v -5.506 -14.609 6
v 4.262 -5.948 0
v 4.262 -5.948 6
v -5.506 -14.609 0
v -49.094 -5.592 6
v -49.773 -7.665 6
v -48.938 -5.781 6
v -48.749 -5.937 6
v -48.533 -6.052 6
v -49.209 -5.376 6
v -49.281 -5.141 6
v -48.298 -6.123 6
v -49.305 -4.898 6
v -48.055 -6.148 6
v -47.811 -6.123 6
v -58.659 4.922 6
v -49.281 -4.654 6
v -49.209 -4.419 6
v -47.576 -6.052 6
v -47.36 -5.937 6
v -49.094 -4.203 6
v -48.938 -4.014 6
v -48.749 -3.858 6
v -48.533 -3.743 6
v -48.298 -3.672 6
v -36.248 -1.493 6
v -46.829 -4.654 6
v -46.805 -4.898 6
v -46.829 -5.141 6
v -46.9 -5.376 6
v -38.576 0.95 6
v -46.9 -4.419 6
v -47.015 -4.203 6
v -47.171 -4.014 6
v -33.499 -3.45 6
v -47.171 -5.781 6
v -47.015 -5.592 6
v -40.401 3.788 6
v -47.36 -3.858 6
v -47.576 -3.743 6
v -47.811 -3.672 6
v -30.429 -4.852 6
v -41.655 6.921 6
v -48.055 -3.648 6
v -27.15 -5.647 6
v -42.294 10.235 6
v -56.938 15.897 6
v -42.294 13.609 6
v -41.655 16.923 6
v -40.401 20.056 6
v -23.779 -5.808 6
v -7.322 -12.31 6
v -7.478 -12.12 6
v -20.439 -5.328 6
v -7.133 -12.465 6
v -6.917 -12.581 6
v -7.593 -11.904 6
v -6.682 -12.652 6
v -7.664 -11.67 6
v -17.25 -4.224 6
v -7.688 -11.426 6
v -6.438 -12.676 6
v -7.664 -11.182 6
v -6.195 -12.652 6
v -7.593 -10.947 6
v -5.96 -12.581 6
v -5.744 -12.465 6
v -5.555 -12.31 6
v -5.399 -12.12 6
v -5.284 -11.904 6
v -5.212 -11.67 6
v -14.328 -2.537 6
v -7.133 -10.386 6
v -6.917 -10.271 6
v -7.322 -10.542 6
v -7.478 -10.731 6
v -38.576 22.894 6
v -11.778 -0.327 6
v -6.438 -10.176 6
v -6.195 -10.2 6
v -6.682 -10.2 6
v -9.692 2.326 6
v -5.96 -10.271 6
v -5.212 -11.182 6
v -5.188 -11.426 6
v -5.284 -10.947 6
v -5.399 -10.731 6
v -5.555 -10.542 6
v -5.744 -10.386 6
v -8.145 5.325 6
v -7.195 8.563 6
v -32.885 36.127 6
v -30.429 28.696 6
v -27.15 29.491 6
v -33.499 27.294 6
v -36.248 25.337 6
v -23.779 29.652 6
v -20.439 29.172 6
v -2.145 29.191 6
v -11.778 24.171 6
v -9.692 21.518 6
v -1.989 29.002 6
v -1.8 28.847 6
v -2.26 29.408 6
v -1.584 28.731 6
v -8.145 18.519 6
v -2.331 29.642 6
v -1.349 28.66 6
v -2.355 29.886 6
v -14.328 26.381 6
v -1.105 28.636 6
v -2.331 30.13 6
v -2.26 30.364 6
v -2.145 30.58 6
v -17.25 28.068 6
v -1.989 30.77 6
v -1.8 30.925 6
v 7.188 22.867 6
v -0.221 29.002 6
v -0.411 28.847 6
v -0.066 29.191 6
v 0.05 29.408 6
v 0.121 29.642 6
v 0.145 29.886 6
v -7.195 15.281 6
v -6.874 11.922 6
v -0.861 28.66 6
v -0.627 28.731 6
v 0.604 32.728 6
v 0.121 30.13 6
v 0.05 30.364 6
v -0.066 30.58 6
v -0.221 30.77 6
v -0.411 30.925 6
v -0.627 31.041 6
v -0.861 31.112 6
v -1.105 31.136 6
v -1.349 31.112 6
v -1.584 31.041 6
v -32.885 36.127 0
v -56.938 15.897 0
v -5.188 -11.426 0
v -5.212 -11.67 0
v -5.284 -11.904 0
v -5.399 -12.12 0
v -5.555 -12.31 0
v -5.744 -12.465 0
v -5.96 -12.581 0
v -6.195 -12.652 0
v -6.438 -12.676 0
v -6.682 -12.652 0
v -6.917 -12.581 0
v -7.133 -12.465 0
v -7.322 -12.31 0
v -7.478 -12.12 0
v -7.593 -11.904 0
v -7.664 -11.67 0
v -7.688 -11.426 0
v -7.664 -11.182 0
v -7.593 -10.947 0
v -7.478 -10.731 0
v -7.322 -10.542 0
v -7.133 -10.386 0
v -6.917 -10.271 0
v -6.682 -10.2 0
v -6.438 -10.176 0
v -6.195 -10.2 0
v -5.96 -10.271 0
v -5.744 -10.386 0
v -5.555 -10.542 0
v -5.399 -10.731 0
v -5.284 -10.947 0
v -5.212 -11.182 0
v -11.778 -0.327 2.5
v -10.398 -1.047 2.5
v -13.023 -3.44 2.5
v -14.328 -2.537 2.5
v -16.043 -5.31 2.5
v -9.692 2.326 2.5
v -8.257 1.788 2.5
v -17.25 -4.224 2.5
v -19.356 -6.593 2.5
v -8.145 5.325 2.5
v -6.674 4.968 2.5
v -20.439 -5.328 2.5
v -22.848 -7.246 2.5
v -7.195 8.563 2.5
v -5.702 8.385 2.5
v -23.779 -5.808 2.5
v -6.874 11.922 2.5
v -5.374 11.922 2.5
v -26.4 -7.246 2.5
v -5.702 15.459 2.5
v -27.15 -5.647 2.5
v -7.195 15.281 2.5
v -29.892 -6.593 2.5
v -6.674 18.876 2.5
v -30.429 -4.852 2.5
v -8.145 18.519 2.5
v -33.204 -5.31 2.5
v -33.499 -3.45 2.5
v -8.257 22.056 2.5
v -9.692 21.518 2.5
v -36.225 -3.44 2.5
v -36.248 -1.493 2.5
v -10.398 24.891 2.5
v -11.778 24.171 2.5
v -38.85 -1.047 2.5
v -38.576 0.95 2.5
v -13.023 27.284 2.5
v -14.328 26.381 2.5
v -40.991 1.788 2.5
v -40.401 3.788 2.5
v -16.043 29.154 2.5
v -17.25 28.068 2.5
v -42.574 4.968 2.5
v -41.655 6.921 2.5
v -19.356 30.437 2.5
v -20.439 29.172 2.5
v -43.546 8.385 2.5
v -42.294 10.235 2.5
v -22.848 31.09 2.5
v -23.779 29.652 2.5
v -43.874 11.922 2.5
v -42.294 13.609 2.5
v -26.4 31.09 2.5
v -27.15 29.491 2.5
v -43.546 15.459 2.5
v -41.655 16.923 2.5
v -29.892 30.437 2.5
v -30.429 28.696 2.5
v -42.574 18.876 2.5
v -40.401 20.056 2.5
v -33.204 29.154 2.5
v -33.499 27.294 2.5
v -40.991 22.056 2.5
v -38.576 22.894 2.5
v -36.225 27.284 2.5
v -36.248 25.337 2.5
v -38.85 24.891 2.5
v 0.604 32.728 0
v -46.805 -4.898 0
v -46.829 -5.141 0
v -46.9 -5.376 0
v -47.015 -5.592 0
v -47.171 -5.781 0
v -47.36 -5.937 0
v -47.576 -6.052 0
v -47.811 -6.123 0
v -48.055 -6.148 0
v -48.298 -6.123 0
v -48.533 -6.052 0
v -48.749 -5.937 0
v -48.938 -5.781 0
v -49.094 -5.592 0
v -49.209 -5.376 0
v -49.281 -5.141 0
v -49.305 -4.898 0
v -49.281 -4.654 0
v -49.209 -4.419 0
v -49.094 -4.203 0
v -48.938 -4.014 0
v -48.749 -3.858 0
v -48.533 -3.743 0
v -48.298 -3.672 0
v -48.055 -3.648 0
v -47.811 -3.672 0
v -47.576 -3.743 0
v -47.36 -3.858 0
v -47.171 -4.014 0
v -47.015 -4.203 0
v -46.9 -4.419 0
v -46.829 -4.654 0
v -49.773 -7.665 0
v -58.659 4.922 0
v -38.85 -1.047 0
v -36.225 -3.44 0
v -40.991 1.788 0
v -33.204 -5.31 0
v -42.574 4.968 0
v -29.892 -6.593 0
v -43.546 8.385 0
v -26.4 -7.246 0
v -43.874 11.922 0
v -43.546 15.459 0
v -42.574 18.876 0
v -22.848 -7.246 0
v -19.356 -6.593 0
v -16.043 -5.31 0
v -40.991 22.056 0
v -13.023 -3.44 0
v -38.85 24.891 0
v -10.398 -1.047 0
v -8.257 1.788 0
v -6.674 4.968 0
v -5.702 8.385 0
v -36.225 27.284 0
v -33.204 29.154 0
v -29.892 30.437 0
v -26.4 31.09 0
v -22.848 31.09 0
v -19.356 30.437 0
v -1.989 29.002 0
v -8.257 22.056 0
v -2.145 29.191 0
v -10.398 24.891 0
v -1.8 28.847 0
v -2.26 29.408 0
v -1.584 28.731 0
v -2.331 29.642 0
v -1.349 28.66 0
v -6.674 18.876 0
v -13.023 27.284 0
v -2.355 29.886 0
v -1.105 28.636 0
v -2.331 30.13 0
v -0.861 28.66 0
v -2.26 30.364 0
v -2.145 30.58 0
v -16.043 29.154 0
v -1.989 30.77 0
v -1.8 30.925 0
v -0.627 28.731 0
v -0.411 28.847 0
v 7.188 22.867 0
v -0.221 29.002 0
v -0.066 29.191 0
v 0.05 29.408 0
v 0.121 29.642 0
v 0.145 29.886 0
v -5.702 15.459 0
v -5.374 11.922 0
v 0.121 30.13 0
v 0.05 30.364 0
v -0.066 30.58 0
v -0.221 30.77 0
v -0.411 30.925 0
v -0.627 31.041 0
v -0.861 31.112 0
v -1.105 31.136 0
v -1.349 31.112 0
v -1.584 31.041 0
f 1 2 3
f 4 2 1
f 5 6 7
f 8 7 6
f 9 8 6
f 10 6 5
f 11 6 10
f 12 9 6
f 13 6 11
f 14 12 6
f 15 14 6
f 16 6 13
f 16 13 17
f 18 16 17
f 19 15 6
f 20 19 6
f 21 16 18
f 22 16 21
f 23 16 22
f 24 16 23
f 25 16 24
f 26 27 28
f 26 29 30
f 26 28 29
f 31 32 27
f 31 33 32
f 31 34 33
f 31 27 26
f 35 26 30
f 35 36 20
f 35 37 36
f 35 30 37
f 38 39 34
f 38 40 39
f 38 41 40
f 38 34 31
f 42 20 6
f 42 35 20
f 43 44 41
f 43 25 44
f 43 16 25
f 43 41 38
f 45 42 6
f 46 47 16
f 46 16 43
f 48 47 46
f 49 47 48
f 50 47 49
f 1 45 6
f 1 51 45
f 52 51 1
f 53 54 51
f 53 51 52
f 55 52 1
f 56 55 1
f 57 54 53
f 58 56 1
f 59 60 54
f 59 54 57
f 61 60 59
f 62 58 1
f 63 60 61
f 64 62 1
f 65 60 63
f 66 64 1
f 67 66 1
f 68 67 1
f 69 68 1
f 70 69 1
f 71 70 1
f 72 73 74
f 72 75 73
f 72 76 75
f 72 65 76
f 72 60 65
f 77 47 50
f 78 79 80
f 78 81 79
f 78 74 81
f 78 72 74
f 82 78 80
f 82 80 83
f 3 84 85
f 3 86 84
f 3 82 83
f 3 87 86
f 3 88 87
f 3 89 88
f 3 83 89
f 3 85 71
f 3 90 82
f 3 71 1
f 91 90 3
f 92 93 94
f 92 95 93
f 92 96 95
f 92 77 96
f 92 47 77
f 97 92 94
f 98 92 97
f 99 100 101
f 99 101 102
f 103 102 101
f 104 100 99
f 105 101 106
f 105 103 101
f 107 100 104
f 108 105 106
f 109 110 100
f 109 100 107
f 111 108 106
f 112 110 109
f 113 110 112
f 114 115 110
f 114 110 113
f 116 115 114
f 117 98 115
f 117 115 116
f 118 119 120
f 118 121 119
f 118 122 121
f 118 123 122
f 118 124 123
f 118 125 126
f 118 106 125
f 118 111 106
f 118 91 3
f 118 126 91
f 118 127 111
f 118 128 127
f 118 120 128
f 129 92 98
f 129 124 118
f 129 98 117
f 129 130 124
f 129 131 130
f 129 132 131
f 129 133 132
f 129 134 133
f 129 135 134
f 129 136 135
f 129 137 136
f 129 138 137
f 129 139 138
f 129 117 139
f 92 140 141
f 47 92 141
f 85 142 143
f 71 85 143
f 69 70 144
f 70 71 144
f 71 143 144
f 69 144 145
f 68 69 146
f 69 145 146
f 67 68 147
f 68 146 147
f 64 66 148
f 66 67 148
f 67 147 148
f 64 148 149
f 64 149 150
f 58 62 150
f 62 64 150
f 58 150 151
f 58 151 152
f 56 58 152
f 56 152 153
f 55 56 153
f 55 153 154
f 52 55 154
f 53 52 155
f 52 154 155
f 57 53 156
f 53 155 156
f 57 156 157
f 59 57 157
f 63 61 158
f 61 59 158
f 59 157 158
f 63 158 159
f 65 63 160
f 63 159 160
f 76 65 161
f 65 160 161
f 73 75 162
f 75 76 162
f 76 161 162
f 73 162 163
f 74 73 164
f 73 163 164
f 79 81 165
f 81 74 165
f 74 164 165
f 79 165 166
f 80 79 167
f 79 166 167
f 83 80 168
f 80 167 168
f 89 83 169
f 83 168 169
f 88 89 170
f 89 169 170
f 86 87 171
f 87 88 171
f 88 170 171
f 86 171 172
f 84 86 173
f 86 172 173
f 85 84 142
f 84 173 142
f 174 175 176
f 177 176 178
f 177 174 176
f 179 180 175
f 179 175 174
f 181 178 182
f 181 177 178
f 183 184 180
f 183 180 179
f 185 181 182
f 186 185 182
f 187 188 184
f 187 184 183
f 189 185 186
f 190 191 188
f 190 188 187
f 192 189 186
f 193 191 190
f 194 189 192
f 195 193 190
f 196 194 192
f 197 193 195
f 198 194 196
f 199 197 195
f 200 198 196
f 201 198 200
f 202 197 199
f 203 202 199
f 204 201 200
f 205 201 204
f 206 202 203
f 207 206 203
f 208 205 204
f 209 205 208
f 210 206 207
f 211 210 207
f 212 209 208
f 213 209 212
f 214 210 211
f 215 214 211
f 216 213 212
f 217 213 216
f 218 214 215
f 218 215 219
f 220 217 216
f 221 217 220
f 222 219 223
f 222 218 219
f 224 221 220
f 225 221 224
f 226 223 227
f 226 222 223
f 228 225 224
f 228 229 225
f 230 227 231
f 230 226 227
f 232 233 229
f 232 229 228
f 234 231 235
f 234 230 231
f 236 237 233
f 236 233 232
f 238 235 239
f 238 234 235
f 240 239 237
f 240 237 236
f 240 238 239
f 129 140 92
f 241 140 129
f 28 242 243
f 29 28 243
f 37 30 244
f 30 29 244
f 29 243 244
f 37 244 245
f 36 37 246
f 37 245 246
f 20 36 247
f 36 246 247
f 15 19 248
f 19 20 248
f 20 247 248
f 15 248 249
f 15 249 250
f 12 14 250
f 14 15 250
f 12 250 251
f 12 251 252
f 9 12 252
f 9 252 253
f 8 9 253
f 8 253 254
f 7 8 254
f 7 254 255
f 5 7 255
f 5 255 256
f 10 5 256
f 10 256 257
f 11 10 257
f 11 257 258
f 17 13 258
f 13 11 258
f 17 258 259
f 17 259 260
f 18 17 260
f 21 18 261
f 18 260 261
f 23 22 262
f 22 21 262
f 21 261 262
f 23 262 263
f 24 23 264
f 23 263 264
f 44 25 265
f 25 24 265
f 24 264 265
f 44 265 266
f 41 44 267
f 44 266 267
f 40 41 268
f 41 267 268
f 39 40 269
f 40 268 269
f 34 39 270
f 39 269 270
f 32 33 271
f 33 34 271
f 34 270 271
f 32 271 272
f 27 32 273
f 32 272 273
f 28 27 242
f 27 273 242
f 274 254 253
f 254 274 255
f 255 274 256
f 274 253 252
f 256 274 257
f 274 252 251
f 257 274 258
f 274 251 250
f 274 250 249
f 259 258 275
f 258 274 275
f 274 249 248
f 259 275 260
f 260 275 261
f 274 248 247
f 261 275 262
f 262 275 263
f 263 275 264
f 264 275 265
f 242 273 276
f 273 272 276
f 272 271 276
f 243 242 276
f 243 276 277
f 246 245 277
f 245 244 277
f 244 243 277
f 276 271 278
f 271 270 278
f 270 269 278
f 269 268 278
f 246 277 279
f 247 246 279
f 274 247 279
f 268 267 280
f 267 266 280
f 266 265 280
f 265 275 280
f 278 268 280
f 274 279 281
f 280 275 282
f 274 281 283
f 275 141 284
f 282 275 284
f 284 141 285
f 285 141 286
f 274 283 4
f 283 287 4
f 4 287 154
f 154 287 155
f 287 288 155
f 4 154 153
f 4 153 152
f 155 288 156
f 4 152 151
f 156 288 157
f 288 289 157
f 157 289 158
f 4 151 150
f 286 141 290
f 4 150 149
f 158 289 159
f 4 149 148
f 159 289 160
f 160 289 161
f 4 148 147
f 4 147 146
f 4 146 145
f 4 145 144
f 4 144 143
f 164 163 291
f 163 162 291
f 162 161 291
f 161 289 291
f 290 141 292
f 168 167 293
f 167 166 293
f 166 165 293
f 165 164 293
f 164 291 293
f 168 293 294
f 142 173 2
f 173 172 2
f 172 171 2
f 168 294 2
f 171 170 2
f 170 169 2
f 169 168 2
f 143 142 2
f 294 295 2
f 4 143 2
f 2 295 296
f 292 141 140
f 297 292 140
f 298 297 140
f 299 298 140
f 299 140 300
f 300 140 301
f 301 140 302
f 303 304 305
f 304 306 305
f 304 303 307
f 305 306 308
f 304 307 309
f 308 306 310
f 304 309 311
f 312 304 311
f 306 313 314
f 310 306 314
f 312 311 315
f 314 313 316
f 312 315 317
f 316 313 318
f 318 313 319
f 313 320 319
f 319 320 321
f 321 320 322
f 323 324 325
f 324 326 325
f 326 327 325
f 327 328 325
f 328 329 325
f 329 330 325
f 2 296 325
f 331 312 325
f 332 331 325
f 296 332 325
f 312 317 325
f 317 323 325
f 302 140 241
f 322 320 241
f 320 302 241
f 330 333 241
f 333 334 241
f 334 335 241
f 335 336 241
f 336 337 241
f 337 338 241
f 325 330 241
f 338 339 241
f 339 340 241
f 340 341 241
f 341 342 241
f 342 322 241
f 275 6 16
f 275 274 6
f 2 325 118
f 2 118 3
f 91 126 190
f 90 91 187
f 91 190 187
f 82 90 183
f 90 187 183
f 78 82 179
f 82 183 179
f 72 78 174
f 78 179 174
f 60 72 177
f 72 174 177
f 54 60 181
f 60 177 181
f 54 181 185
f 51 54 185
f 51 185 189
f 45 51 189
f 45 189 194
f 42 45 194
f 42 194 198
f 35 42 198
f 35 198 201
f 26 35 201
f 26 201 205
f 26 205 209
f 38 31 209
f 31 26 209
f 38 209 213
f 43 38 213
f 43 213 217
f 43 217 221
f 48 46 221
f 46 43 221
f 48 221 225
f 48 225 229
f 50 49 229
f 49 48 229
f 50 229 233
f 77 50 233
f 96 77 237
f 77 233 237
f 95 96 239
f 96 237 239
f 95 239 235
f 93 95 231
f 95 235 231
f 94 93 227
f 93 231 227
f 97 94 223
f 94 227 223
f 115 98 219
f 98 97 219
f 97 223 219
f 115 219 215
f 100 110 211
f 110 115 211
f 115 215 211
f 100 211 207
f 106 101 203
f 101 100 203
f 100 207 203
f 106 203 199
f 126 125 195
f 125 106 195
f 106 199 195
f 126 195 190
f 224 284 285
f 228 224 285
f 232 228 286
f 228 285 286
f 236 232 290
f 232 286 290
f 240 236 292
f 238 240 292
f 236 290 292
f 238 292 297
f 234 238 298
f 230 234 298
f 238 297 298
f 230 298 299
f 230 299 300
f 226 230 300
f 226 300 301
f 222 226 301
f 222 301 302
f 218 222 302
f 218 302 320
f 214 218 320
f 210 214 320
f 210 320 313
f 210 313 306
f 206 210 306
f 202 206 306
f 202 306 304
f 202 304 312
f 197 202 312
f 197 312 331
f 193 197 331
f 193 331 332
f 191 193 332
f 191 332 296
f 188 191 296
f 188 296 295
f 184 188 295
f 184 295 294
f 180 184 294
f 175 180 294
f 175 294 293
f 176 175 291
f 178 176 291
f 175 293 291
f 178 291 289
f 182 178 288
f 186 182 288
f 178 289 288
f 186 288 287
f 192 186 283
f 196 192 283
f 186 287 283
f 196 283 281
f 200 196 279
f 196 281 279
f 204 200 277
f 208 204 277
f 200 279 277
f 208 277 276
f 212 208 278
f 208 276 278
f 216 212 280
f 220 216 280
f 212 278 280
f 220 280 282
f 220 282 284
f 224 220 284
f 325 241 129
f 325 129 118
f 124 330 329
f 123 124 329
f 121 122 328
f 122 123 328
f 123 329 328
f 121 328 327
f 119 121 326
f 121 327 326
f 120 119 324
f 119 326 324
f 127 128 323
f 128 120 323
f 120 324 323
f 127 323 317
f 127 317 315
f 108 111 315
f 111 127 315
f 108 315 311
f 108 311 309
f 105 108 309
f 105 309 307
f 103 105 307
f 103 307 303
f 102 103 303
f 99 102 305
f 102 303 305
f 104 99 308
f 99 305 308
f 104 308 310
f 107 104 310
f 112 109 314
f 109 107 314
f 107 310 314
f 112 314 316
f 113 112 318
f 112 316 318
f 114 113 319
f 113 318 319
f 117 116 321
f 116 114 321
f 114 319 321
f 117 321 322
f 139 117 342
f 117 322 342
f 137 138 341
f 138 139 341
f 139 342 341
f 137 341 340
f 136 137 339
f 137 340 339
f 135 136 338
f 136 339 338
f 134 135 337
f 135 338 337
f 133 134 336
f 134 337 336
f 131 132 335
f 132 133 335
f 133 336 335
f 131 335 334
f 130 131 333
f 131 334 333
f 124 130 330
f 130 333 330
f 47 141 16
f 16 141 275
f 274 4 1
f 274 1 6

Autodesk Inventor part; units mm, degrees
ref_plane "YZ Plane" through (0, 0, 0) normal (1, 0, 0) x (0, 1, 0)
ref_plane "XZ Plane" through (0, 0, 0) normal (0, 1, 0) x (-1, 0, 0)
ref_plane "XY Plane" through (0, 0, 0) normal (0, 0, 1) x (1, 0, 0)
sketch "Sketch1" plane through (0, 0, 0) normal (0, 0, 1) x (1, 0, 0)
  line L0 (0.6045, 32.7277) -> (-43.9747, 37.2532) construction
  line L1 (-49.7733, -7.6646) -> (-5.5064, -14.6087) construction
  circle A0 centre (-43.015, 34.1404) radius 3.175 construction
  line L2 (-5.5064, -14.6087) -> (15.1919, 3.7419) construction
  line L3 (-42.0553, 31.0275) -> (-2.8152, 27.0441) construction
  line L4 (-7.3705, -8.2429) -> (-46.3358, -2.1305) construction
  line L5 (9.5291, 6.74) -> (-7.3705, -8.2429) construction
  line L6 (-2.8152, 27.0441) -> (9.7254, 8.2606) construction
  line L7 (-32.8846, 36.1274) -> (0.6045, 32.7277)
  line L8 (-32.8846, 36.1274) -> (-56.9375, 15.8971)
  line L9 (-65.2029, 14.1906) -> (-49.7733, -7.6646) construction
  line L10 (15.9639, 9.7222) -> (0.6045, 32.7277) construction
  line L11 (0.6045, 32.7277) -> (7.1877, 22.8674)
  line L12 (7.1877, 22.8674) -> (4.2625, -5.9478)
  line L13 (4.2625, -5.9478) -> (-5.5064, -14.6087)
  line L14 (-5.5064, -14.6087) -> (-49.7733, -7.6646)
  line L15 (-49.7733, -7.6646) -> (-58.6592, 4.9218)
  line L16 (-56.9375, 15.8971) -> (-58.6592, 4.9218)
  line L17 (-58.7974, 16.9461) -> (-42.0553, 31.0275) construction
  circle A1 centre (-24.6239, 11.922) radius 17.75
  circle A2 centre (-1.1053, 29.8859) radius 1.25
  circle A3 centre (-48.0546, -4.8975) radius 1.25
  circle A4 centre (-6.4384, -11.4258) radius 1.25
  point P0 (0, 0)
  dimension "d0" = 2
  dimension "d1" = 2
  dimension "d2" = 4
extrude "Extrusion1" add sketch "Sketch1" along normal blind 6
sketch "Sketch2" plane through (0, 0, 0) normal (0, 0, -1) x (-1, 0, 0)
  circle A0 centre (24.6239, 11.922) radius 17.75 projected
  circle A1 centre (24.6239, 11.922) radius 19.25
  point P0 (0, 0)
  dimension "d5" = 38.5
extrude "Extrusion2" cut sketch "Sketch2" against normal blind 2.5
equation "\"d1\" = d0"
properties part number "TongueSideLid"
